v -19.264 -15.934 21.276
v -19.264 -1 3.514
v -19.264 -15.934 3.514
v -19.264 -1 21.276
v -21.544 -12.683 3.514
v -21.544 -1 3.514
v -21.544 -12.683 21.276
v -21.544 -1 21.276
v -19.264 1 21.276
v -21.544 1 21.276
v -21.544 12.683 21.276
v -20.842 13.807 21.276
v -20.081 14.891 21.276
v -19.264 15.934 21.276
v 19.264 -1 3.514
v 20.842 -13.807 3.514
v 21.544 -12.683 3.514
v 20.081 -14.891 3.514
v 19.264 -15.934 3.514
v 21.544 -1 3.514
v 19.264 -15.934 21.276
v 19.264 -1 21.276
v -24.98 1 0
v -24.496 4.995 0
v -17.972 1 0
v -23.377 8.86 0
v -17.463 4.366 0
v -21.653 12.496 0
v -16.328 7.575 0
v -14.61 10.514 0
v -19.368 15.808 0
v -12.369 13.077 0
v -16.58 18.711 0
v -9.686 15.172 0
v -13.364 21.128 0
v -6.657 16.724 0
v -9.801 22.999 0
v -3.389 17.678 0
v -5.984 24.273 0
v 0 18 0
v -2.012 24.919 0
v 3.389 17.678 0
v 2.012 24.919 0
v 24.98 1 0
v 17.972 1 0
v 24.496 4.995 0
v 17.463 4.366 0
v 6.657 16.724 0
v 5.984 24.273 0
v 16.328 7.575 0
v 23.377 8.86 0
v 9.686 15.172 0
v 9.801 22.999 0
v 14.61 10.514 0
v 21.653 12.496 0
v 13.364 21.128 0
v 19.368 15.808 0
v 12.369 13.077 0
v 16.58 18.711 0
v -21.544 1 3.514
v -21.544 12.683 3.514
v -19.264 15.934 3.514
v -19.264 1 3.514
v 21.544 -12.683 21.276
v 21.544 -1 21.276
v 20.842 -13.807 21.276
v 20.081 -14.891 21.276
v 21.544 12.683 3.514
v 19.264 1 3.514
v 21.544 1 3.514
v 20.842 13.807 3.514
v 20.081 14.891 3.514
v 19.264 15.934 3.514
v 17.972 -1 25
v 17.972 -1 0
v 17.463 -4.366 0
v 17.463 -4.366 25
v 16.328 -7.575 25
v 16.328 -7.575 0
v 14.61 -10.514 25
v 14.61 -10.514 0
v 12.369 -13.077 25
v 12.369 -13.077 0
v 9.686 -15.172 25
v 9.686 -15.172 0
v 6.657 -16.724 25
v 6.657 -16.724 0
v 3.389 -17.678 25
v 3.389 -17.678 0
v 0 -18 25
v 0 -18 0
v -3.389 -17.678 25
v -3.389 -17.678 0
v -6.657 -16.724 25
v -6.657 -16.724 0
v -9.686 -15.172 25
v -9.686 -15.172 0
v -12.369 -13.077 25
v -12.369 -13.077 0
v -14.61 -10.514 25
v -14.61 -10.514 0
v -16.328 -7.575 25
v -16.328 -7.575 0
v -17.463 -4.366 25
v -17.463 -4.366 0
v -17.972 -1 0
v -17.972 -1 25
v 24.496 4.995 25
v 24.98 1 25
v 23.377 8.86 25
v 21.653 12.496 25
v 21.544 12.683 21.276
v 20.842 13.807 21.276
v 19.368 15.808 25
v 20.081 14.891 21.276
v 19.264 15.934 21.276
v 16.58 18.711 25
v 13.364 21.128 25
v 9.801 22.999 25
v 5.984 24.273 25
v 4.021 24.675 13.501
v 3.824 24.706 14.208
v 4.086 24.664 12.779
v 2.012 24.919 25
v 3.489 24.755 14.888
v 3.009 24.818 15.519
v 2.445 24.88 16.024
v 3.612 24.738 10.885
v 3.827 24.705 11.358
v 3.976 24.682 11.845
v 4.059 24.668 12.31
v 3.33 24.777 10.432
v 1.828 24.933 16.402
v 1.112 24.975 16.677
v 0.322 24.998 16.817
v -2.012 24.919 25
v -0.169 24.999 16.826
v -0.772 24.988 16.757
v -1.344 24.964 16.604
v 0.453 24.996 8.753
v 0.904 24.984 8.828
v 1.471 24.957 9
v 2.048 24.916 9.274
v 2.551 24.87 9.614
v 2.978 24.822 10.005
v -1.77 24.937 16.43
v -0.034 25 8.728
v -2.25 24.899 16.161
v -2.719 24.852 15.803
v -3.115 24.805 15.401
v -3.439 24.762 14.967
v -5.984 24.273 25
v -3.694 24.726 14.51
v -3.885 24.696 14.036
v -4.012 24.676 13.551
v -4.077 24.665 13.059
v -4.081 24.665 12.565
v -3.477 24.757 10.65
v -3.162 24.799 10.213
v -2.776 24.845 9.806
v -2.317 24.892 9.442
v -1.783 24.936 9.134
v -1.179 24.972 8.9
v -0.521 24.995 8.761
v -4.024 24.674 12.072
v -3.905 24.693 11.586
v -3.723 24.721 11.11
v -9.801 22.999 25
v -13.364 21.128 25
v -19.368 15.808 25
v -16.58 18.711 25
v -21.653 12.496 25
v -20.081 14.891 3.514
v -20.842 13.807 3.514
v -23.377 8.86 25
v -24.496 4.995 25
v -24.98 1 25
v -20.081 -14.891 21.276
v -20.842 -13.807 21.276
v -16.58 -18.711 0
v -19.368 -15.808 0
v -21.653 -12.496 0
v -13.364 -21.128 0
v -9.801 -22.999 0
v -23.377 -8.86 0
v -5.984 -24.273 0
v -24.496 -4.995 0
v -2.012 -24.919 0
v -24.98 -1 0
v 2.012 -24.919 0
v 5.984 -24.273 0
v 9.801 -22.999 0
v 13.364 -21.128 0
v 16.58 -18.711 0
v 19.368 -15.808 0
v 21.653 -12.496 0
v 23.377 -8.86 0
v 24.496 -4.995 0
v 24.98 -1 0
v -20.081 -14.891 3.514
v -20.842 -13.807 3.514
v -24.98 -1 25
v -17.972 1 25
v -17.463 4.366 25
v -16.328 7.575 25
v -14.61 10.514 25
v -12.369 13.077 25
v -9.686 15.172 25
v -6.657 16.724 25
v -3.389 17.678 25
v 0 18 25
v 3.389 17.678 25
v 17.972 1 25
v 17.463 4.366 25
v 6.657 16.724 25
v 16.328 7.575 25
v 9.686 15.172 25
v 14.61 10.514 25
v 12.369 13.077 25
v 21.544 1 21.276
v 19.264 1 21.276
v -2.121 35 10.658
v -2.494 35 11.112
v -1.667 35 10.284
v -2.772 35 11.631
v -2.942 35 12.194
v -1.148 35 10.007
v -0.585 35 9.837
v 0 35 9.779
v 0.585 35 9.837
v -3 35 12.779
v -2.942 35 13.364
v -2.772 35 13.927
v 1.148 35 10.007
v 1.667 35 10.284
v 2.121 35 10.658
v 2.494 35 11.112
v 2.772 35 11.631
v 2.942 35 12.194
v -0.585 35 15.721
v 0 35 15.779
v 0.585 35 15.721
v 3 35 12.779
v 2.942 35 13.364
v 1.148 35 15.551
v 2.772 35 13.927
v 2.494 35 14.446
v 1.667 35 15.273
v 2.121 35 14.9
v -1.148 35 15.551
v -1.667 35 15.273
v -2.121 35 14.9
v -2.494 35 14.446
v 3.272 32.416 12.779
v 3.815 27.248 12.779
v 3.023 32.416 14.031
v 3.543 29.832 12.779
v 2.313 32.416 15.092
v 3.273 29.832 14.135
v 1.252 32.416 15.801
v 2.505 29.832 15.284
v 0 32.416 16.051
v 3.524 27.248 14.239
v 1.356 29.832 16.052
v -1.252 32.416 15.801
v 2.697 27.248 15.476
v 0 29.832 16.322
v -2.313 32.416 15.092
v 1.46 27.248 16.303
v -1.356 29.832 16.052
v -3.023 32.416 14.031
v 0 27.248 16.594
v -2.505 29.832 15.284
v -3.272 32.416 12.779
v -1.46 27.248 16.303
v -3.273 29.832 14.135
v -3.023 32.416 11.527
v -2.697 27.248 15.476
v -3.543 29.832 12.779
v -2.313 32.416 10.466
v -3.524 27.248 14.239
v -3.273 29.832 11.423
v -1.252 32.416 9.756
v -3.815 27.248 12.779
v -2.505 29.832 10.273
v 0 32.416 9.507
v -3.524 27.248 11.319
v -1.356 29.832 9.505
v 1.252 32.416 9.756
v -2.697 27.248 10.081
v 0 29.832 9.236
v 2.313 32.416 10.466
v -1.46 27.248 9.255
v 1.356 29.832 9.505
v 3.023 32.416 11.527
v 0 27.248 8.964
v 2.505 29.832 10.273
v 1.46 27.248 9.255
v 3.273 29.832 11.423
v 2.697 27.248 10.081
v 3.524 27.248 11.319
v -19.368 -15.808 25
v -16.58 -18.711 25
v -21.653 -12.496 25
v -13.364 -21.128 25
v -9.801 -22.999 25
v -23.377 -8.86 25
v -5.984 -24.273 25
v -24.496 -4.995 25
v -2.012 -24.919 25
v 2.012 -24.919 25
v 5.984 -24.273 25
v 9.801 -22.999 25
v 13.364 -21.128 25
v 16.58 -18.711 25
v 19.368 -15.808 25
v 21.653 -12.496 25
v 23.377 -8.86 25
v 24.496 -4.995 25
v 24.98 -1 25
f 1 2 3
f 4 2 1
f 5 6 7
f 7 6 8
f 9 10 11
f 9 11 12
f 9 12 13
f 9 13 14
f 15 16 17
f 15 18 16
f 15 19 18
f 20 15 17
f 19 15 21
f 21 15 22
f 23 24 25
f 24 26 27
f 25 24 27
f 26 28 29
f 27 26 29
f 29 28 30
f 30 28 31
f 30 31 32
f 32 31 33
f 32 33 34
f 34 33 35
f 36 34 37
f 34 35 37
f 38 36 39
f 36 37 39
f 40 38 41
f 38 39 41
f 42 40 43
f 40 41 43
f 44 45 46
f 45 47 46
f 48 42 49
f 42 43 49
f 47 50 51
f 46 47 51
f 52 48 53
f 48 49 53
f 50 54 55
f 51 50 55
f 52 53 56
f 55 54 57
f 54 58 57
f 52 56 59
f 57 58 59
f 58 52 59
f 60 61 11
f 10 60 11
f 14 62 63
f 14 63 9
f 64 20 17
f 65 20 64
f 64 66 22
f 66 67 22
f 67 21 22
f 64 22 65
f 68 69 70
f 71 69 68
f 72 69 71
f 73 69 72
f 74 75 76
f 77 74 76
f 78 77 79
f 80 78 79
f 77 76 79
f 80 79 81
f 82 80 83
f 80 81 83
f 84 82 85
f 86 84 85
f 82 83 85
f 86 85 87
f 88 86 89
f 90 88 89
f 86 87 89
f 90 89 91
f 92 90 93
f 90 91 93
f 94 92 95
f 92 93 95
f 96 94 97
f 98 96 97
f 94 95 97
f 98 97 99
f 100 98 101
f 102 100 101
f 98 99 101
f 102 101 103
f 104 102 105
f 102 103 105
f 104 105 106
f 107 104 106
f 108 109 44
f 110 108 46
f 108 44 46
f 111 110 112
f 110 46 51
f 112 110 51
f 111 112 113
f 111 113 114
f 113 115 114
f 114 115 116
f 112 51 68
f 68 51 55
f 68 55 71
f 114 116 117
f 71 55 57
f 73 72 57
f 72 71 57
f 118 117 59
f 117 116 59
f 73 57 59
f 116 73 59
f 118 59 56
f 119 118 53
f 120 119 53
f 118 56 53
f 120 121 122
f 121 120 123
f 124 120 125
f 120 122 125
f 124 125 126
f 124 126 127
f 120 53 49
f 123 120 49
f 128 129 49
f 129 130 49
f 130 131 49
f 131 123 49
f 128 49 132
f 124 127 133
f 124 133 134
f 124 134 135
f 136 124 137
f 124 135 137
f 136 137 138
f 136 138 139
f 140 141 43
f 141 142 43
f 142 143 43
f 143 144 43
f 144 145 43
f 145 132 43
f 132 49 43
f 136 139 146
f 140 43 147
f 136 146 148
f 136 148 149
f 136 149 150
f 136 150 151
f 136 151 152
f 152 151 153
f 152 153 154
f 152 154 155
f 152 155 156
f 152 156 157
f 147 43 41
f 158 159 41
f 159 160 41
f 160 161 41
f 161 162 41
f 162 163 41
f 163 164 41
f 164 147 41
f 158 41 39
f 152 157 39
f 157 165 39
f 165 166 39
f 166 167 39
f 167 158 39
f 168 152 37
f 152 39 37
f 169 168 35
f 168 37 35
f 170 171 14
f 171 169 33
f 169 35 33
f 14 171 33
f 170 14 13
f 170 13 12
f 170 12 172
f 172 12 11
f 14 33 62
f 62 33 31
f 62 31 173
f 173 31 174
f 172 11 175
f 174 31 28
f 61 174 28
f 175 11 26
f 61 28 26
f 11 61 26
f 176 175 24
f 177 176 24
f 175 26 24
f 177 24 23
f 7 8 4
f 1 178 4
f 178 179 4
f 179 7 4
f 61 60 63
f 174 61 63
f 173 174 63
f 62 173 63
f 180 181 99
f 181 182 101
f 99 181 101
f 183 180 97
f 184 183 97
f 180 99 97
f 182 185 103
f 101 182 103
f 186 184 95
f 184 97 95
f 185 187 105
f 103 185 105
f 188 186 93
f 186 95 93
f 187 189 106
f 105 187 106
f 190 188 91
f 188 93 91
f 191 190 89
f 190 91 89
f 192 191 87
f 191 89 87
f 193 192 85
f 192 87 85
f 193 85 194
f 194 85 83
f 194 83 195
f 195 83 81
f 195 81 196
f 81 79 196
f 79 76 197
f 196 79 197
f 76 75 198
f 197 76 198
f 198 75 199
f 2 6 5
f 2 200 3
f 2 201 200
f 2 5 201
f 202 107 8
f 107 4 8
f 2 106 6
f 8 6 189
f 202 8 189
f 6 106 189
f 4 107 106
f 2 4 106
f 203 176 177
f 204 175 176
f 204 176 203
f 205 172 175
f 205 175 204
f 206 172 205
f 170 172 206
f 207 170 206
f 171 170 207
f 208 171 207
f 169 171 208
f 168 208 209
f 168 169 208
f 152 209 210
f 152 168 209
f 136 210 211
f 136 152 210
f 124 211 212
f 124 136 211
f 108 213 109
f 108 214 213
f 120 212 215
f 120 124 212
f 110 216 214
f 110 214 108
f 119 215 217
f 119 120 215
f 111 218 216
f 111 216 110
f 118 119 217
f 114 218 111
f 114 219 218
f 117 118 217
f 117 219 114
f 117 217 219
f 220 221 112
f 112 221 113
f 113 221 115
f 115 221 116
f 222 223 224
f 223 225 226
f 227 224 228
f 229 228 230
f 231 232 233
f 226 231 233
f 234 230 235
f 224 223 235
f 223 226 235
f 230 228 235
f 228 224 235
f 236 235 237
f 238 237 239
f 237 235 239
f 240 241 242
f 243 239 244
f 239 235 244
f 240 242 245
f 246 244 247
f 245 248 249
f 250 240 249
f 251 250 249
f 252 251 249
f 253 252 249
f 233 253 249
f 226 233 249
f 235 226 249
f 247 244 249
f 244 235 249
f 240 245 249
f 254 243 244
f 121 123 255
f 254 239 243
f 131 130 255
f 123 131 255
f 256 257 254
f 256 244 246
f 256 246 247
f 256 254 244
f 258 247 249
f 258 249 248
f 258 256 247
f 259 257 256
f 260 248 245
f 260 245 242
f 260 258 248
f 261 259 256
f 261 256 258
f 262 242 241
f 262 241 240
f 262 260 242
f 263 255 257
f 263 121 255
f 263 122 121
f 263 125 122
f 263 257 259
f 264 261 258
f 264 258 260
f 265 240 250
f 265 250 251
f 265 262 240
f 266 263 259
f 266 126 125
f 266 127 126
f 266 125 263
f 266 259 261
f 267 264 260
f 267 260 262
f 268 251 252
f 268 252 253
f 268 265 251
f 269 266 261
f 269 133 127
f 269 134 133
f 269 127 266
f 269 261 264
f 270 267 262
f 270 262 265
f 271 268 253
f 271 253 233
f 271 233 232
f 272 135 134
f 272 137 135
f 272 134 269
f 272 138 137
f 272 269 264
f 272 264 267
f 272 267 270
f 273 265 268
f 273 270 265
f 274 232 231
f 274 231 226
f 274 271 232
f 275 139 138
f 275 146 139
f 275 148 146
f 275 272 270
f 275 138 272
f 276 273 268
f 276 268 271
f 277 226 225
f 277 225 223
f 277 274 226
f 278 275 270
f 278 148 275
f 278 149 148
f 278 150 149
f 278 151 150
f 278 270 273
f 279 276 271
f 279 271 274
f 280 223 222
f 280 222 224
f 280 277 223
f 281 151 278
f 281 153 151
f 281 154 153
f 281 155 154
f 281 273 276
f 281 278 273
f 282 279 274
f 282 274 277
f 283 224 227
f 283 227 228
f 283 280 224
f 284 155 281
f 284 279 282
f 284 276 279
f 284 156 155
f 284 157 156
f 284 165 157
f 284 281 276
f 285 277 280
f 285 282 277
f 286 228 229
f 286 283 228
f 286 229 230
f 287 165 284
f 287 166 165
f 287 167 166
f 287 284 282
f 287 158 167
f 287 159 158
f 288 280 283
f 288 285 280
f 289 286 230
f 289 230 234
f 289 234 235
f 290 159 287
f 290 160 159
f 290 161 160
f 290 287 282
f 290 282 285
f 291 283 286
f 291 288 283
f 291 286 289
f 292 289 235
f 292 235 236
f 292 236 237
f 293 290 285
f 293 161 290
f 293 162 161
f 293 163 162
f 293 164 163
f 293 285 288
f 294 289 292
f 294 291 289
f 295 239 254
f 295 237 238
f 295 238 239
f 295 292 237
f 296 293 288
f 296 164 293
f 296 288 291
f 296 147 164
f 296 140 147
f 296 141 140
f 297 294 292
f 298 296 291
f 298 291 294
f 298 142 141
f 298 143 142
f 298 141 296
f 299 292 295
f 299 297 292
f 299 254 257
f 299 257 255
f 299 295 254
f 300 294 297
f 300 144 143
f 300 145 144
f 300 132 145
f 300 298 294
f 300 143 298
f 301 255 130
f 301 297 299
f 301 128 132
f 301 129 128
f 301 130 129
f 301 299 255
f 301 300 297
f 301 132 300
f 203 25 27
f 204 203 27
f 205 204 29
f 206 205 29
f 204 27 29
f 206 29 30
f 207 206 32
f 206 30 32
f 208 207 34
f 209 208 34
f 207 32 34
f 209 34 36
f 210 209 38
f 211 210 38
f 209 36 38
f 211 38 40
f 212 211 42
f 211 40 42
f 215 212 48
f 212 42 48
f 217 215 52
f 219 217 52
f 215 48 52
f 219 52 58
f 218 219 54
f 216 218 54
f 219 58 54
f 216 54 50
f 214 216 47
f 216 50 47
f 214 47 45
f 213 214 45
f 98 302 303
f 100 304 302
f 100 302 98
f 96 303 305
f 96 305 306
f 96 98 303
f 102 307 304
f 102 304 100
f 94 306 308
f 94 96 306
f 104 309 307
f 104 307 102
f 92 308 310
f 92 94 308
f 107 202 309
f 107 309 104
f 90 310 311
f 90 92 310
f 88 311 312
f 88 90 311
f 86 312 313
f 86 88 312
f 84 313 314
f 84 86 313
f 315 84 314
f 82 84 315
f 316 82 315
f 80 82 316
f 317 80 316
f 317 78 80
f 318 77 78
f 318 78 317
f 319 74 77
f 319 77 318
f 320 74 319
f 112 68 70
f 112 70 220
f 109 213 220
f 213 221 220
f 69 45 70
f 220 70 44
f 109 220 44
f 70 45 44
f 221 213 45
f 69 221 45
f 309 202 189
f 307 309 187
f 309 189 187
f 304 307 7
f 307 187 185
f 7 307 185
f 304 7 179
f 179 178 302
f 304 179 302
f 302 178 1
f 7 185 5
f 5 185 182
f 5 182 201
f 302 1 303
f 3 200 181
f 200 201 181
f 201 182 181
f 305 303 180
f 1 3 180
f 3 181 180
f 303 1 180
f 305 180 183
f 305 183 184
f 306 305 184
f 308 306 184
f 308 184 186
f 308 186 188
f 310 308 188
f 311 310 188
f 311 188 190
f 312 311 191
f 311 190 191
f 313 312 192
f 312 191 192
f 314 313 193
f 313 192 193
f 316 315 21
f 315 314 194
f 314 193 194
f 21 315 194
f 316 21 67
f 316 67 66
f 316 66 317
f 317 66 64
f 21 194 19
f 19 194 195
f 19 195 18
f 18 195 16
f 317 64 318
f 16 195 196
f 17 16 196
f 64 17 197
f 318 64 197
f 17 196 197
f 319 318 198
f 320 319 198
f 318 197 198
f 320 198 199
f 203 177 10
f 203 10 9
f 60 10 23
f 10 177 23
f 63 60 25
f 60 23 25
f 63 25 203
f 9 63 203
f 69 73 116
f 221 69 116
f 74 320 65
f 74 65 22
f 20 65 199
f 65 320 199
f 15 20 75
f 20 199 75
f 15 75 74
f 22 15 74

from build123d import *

# Parameters (mm, degrees)
F1_DEPTH      = 25
F2_W          = 2.2795144469
F2_H          = 17.7612202242
F3_DEPTH      = 25
F3_DEPTH_BACK = 25
F5_R          = 3
F6_DEPTH      = 13.8
F6_TAPER      = -6


with BuildPart() as f1:
    # F0 (on Top) → F1 (new body)
    with BuildSketch(Plane.XY):
        with BuildLine():
            Line((17.9722007556, 1), (24.9799919936, 1))
            ThreePointArc((24.9799919936, 1), (0, 25), (-24.9799919936, 1))
            Line((-24.9799919936, 1), (-17.9722007556, 1))
            ThreePointArc((-17.9722007556, 1), (0, 18), (17.9722007556, 1))
        make_face()
    extrude(amount=F1_DEPTH)


with BuildPart() as f1b:
    # F0 (on Top) → F1, piece 2 (new body)
    with BuildSketch(Plane.XY):
        with BuildLine():
            ThreePointArc((17.9722007556, -1), (0, -18), (-17.9722007556, -1))
            Line((-17.9722007556, -1), (-24.9799919936, -1))
            ThreePointArc((-24.9799919936, -1), (0, -25), (24.9799919936, -1))
            Line((24.9799919936, -1), (17.9722007556, -1))
        make_face()
    extrude(amount=F1_DEPTH)


with BuildPart() as f3_tool:
    # F2 (on Front) → F3 (new body, two sides)
    with BuildSketch(Plane.XZ) as f3_sk:
        with Locations((20.4039188102, 12.3949158005)):
            Rectangle(F2_W, F2_H)
        with Locations((-20.4039188102, 12.3949158005)):
            Rectangle(F2_W, F2_H)
    extrude(amount=-F3_DEPTH)
    extrude(f3_sk.sketch, amount=F3_DEPTH_BACK)


with BuildPart() as f1_1:
    add(f1.part)

    # F3: cut by f3_tool
    add(f3_tool.part, mode=Mode.SUBTRACT)

    # F5 (on offset) → F6 (join)
    with BuildSketch(Plane.XZ.offset(-35)):
        with Locations((0, 12.7789061517)):
            Circle(F5_R)
    extrude(amount=F6_DEPTH, taper=F6_TAPER)


with BuildPart() as f1b_1:
    add(f1b.part)

    # F3: cut by f3_tool
    add(f3_tool.part, mode=Mode.SUBTRACT)


solid = Compound([f1_1.part, f1b_1.part])
